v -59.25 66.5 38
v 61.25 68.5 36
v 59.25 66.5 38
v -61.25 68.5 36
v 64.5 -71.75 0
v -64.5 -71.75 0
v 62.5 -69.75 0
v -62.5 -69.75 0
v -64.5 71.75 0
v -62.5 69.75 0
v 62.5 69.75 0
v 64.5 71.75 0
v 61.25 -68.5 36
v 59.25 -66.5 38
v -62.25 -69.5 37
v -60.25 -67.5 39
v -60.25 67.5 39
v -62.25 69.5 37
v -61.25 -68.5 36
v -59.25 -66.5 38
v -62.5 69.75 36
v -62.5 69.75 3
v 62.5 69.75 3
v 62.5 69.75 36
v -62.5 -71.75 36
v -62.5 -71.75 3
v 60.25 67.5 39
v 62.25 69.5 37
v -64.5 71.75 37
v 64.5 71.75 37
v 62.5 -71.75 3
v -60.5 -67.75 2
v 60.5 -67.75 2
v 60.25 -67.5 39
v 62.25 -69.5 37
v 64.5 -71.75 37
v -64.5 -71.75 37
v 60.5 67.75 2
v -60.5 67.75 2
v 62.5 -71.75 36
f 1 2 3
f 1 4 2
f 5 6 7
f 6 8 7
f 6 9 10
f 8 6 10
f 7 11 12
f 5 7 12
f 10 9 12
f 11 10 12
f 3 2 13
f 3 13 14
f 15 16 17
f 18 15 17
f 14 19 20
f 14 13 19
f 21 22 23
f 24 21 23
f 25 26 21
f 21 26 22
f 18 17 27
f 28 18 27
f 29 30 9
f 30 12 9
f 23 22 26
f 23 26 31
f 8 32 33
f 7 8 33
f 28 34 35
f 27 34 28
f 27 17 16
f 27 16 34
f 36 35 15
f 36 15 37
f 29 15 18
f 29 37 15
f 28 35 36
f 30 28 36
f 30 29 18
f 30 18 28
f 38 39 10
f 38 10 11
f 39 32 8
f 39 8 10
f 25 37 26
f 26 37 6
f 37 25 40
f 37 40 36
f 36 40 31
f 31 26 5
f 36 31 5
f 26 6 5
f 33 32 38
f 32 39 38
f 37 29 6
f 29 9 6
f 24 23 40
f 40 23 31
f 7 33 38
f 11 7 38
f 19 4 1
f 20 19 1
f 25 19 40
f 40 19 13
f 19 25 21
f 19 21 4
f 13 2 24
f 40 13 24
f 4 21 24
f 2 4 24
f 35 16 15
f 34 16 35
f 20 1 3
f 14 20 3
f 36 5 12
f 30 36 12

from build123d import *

# Parameters (mm, degrees)
F0_W      = 129
F0_H      = 143.5
F0_W_2    = 125
F0_H_2    = 139.5
F1_DEPTH  = 3
F2_DEPTH  = 2
F3_SIZE   = 1.99999
F5_DEPTH  = 33
F6_W      = 125
F6_H      = 141.5
F6_W_2    = 124.5
F6_H_2    = 139
F6_W_3    = 122.5
F6_H_3    = 137
F7_DEPTH  = 1
F8_DEPTH  = 3
F9_SIZE   = 1.99999
F10_DEPTH = 2
F10_TAPER = 45


# Not quite as in the source:
# - a fillet or chamfer is up to 0.001 mm smaller than in the source, because OpenCascade refuses the exact size
# - a feature names something its author has since deleted; it is built from what else it names


with BuildPart() as f1:
    # F0 (on Top) → F1 (new body)
    with BuildSketch(Plane.XY):
        Rectangle(F0_W, F0_H)
        Rectangle(F0_W_2, F0_H_2, mode=Mode.SUBTRACT)
        Rectangle(F0_W_2, F0_H_2)
    extrude(amount=F1_DEPTH)

    # F0 (on Top) → F2 (cut)
    with BuildSketch(Plane.XY):
        Rectangle(F0_W_2, F0_H_2)
    extrude(amount=F2_DEPTH, mode=Mode.SUBTRACT)

    # F3 (size 2 in the source; OpenCascade refuses exactly that, so slightly less here)
    f3_edges = [f1.edges().sort_by_distance(p)[0] for p in [
        (0, -69.75, 2),
        (62.5, 0, 2),
        (0, 69.75, 2),
        (-62.5, 0, 2),
    ]]
    chamfer(f3_edges, length=F3_SIZE)

    # F4 (on face) → F5 (join)
    with BuildSketch(Plane.XY.offset(3)):
        Polygon((-64.5, 71.75), (-64.5, -71.75), (-62.5, -71.75), (-62.5, 69.75), (62.5, 69.75), (62.5, -71.75), (64.5, -71.75), (64.5, 71.75), align=None)
    extrude(amount=F5_DEPTH)

    # F6 (on face) → F7 (join)
    with BuildSketch(Plane.XY.offset(36)):
        with Locations((0, -1)):
            Rectangle(F6_W, F6_H)
        Rectangle(F6_W_2, F6_H_2, mode=Mode.SUBTRACT)
        Rectangle(F6_W_2, F6_H_2)
        Rectangle(F6_W_3, F6_H_3, mode=Mode.SUBTRACT)
        Polygon((-64.5, 71.75), (-64.5, -71.75), (-62.5, -71.75), (-62.5, 69.75), (62.5, 69.75), (62.5, -71.75), (64.5, -71.75), (64.5, 71.75), align=None)
    extrude(amount=F7_DEPTH)

    # F6 (on face) → F8 (join)
    with BuildSketch(Plane.XY.offset(36)):
        Rectangle(F6_W_2, F6_H_2)
        Rectangle(F6_W_3, F6_H_3, mode=Mode.SUBTRACT)
        Rectangle(F6_W_3, F6_H_3)
    extrude(amount=F8_DEPTH)

    # F9 (size 2 in the source; OpenCascade refuses exactly that, so slightly less here)
    f9_edges = [f1.edges().sort_by_distance(p)[0] for p in [
        (-62.25, 0, 39),
        (0, 69.5, 39),
        (0, -69.5, 39),
        (62.25, 0, 39),
    ]]
    chamfer(f9_edges, length=F9_SIZE)

    # F6 (on face) → F10 (cut)
    with BuildSketch(Plane.XY.offset(36)):
        Rectangle(F6_W_3, F6_H_3)
    extrude(amount=F10_DEPTH, taper=F10_TAPER, mode=Mode.SUBTRACT)


solid = f1.part
